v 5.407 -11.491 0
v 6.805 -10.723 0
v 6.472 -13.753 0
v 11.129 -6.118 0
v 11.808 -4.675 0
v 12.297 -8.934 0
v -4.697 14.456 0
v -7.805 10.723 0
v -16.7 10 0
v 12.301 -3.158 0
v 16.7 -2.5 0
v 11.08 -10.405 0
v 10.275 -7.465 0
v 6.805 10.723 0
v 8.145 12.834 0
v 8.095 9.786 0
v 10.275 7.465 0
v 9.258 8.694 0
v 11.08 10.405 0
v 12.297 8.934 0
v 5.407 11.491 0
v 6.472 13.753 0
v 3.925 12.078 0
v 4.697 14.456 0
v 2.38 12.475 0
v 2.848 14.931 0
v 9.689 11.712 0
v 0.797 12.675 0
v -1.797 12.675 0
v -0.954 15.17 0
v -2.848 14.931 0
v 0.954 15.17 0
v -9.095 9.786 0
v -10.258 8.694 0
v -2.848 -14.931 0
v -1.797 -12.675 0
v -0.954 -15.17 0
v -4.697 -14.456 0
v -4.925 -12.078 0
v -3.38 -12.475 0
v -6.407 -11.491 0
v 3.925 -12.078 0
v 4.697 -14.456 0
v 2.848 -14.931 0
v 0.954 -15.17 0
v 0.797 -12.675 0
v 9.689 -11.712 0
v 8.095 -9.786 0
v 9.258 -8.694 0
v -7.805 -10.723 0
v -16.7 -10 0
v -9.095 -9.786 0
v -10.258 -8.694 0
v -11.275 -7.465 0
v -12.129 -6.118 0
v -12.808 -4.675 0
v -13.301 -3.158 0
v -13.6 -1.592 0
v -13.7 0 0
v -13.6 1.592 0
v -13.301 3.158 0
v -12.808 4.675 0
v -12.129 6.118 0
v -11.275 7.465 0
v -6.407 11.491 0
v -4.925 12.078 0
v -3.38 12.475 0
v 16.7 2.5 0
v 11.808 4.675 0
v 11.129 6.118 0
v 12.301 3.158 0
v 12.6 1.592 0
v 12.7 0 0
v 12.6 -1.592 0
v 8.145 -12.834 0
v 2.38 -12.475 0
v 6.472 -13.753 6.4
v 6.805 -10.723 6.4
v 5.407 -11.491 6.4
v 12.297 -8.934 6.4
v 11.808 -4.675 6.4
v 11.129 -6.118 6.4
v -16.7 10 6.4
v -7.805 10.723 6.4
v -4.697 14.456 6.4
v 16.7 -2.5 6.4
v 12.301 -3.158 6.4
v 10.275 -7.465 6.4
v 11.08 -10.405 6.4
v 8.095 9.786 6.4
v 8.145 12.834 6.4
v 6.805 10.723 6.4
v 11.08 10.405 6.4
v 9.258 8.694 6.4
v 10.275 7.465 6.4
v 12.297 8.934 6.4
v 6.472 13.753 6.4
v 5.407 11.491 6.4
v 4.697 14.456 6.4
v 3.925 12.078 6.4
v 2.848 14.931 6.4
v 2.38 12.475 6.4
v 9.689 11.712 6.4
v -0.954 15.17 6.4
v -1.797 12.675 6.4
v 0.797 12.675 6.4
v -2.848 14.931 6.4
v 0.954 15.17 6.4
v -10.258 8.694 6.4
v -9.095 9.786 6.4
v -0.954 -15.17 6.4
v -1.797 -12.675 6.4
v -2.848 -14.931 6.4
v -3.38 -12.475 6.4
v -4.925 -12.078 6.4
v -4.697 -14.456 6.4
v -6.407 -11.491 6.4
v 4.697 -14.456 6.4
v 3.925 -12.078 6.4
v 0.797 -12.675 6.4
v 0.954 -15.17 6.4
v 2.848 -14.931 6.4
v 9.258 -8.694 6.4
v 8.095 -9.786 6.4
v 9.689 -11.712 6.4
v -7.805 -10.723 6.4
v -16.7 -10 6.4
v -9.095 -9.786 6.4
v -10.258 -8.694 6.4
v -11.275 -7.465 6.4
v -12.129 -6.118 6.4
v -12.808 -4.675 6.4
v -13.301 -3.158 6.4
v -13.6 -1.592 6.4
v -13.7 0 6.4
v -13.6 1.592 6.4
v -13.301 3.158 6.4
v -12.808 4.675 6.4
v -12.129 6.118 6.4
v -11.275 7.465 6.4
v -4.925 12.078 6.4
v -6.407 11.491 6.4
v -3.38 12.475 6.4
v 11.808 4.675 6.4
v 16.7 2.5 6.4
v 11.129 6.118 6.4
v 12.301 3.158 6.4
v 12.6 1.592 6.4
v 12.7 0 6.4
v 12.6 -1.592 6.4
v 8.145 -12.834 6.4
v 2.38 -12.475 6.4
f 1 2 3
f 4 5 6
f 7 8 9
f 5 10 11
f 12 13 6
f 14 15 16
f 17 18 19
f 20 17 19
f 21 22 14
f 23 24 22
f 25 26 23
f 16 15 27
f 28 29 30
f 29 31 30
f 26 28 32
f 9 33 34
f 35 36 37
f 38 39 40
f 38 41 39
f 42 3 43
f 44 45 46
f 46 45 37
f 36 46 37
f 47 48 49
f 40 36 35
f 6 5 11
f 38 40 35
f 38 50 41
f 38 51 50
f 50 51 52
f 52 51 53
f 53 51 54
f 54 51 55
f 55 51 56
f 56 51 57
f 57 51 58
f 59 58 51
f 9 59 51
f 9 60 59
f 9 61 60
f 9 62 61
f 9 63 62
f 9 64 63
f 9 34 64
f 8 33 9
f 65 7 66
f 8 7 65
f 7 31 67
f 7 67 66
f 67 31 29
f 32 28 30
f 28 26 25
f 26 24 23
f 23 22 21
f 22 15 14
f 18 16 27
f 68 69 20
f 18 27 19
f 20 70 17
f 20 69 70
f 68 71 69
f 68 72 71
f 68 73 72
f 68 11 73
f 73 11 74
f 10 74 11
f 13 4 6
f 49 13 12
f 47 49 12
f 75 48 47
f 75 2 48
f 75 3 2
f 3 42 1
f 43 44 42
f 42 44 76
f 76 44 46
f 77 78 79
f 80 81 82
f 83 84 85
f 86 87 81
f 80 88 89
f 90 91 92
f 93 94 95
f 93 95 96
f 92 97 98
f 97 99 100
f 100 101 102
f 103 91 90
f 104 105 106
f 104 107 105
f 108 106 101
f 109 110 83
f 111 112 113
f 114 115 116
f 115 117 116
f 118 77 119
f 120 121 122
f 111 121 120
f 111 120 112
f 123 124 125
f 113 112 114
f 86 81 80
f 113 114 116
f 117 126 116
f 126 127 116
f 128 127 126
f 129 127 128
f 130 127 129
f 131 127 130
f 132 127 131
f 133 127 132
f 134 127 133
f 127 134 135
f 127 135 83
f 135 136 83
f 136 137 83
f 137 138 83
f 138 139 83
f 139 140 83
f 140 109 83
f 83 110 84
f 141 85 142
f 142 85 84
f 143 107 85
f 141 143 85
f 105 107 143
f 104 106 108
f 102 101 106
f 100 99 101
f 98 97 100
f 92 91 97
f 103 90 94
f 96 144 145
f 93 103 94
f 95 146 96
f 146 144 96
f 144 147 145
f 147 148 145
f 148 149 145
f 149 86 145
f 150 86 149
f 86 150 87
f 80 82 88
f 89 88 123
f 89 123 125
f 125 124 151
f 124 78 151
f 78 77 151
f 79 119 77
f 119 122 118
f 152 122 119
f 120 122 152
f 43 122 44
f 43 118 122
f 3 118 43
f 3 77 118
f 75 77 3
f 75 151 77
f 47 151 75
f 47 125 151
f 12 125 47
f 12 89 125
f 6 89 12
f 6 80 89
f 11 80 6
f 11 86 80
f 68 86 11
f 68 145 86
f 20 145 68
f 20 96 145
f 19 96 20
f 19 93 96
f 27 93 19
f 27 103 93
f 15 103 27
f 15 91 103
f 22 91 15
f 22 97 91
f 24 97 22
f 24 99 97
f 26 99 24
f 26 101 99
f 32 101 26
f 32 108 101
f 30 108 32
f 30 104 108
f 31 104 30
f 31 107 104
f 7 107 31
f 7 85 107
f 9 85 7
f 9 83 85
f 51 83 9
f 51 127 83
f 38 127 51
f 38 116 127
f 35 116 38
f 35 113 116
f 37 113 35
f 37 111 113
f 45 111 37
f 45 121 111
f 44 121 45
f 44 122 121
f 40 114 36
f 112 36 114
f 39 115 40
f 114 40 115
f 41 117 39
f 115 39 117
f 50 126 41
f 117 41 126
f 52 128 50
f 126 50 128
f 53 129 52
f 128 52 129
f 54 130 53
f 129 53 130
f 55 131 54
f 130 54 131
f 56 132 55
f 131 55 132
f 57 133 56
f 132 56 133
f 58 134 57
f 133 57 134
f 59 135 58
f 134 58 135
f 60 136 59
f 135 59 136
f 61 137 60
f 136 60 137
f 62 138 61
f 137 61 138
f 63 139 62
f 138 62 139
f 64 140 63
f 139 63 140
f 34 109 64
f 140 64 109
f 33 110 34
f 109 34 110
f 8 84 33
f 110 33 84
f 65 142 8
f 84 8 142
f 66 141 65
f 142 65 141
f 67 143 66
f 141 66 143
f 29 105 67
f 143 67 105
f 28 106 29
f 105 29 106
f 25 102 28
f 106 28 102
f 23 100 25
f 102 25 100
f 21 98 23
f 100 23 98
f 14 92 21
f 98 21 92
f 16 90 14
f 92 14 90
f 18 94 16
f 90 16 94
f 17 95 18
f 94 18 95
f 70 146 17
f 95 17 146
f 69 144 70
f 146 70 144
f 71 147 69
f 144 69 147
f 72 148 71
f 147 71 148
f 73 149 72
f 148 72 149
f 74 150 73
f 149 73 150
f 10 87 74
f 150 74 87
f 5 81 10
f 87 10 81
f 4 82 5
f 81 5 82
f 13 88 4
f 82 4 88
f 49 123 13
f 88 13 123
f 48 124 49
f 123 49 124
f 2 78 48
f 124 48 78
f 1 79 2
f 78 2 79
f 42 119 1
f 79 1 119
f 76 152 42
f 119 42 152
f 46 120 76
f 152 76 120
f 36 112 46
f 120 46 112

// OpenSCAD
$fn=50;
inch = 25.4;

module mirror_mount(){
    linear_extrude(6.4){
        difference(){
            hull(){
                union(){
                    circle(r=inch/2+2.5); 
                    translate([-inch/2,0,0])
                    square([8,20], center=true); //base is inch/2+4 from mirror center
                    translate([inch/2, 0, 0])
                    square([8,5], center=true);
                    };
                };
            union(){
                circle(r=inch/2);
                translate([-1,0,0])
                circle(r=inch/2);
            };
            };
        };
    };
    
mirror_mount();
